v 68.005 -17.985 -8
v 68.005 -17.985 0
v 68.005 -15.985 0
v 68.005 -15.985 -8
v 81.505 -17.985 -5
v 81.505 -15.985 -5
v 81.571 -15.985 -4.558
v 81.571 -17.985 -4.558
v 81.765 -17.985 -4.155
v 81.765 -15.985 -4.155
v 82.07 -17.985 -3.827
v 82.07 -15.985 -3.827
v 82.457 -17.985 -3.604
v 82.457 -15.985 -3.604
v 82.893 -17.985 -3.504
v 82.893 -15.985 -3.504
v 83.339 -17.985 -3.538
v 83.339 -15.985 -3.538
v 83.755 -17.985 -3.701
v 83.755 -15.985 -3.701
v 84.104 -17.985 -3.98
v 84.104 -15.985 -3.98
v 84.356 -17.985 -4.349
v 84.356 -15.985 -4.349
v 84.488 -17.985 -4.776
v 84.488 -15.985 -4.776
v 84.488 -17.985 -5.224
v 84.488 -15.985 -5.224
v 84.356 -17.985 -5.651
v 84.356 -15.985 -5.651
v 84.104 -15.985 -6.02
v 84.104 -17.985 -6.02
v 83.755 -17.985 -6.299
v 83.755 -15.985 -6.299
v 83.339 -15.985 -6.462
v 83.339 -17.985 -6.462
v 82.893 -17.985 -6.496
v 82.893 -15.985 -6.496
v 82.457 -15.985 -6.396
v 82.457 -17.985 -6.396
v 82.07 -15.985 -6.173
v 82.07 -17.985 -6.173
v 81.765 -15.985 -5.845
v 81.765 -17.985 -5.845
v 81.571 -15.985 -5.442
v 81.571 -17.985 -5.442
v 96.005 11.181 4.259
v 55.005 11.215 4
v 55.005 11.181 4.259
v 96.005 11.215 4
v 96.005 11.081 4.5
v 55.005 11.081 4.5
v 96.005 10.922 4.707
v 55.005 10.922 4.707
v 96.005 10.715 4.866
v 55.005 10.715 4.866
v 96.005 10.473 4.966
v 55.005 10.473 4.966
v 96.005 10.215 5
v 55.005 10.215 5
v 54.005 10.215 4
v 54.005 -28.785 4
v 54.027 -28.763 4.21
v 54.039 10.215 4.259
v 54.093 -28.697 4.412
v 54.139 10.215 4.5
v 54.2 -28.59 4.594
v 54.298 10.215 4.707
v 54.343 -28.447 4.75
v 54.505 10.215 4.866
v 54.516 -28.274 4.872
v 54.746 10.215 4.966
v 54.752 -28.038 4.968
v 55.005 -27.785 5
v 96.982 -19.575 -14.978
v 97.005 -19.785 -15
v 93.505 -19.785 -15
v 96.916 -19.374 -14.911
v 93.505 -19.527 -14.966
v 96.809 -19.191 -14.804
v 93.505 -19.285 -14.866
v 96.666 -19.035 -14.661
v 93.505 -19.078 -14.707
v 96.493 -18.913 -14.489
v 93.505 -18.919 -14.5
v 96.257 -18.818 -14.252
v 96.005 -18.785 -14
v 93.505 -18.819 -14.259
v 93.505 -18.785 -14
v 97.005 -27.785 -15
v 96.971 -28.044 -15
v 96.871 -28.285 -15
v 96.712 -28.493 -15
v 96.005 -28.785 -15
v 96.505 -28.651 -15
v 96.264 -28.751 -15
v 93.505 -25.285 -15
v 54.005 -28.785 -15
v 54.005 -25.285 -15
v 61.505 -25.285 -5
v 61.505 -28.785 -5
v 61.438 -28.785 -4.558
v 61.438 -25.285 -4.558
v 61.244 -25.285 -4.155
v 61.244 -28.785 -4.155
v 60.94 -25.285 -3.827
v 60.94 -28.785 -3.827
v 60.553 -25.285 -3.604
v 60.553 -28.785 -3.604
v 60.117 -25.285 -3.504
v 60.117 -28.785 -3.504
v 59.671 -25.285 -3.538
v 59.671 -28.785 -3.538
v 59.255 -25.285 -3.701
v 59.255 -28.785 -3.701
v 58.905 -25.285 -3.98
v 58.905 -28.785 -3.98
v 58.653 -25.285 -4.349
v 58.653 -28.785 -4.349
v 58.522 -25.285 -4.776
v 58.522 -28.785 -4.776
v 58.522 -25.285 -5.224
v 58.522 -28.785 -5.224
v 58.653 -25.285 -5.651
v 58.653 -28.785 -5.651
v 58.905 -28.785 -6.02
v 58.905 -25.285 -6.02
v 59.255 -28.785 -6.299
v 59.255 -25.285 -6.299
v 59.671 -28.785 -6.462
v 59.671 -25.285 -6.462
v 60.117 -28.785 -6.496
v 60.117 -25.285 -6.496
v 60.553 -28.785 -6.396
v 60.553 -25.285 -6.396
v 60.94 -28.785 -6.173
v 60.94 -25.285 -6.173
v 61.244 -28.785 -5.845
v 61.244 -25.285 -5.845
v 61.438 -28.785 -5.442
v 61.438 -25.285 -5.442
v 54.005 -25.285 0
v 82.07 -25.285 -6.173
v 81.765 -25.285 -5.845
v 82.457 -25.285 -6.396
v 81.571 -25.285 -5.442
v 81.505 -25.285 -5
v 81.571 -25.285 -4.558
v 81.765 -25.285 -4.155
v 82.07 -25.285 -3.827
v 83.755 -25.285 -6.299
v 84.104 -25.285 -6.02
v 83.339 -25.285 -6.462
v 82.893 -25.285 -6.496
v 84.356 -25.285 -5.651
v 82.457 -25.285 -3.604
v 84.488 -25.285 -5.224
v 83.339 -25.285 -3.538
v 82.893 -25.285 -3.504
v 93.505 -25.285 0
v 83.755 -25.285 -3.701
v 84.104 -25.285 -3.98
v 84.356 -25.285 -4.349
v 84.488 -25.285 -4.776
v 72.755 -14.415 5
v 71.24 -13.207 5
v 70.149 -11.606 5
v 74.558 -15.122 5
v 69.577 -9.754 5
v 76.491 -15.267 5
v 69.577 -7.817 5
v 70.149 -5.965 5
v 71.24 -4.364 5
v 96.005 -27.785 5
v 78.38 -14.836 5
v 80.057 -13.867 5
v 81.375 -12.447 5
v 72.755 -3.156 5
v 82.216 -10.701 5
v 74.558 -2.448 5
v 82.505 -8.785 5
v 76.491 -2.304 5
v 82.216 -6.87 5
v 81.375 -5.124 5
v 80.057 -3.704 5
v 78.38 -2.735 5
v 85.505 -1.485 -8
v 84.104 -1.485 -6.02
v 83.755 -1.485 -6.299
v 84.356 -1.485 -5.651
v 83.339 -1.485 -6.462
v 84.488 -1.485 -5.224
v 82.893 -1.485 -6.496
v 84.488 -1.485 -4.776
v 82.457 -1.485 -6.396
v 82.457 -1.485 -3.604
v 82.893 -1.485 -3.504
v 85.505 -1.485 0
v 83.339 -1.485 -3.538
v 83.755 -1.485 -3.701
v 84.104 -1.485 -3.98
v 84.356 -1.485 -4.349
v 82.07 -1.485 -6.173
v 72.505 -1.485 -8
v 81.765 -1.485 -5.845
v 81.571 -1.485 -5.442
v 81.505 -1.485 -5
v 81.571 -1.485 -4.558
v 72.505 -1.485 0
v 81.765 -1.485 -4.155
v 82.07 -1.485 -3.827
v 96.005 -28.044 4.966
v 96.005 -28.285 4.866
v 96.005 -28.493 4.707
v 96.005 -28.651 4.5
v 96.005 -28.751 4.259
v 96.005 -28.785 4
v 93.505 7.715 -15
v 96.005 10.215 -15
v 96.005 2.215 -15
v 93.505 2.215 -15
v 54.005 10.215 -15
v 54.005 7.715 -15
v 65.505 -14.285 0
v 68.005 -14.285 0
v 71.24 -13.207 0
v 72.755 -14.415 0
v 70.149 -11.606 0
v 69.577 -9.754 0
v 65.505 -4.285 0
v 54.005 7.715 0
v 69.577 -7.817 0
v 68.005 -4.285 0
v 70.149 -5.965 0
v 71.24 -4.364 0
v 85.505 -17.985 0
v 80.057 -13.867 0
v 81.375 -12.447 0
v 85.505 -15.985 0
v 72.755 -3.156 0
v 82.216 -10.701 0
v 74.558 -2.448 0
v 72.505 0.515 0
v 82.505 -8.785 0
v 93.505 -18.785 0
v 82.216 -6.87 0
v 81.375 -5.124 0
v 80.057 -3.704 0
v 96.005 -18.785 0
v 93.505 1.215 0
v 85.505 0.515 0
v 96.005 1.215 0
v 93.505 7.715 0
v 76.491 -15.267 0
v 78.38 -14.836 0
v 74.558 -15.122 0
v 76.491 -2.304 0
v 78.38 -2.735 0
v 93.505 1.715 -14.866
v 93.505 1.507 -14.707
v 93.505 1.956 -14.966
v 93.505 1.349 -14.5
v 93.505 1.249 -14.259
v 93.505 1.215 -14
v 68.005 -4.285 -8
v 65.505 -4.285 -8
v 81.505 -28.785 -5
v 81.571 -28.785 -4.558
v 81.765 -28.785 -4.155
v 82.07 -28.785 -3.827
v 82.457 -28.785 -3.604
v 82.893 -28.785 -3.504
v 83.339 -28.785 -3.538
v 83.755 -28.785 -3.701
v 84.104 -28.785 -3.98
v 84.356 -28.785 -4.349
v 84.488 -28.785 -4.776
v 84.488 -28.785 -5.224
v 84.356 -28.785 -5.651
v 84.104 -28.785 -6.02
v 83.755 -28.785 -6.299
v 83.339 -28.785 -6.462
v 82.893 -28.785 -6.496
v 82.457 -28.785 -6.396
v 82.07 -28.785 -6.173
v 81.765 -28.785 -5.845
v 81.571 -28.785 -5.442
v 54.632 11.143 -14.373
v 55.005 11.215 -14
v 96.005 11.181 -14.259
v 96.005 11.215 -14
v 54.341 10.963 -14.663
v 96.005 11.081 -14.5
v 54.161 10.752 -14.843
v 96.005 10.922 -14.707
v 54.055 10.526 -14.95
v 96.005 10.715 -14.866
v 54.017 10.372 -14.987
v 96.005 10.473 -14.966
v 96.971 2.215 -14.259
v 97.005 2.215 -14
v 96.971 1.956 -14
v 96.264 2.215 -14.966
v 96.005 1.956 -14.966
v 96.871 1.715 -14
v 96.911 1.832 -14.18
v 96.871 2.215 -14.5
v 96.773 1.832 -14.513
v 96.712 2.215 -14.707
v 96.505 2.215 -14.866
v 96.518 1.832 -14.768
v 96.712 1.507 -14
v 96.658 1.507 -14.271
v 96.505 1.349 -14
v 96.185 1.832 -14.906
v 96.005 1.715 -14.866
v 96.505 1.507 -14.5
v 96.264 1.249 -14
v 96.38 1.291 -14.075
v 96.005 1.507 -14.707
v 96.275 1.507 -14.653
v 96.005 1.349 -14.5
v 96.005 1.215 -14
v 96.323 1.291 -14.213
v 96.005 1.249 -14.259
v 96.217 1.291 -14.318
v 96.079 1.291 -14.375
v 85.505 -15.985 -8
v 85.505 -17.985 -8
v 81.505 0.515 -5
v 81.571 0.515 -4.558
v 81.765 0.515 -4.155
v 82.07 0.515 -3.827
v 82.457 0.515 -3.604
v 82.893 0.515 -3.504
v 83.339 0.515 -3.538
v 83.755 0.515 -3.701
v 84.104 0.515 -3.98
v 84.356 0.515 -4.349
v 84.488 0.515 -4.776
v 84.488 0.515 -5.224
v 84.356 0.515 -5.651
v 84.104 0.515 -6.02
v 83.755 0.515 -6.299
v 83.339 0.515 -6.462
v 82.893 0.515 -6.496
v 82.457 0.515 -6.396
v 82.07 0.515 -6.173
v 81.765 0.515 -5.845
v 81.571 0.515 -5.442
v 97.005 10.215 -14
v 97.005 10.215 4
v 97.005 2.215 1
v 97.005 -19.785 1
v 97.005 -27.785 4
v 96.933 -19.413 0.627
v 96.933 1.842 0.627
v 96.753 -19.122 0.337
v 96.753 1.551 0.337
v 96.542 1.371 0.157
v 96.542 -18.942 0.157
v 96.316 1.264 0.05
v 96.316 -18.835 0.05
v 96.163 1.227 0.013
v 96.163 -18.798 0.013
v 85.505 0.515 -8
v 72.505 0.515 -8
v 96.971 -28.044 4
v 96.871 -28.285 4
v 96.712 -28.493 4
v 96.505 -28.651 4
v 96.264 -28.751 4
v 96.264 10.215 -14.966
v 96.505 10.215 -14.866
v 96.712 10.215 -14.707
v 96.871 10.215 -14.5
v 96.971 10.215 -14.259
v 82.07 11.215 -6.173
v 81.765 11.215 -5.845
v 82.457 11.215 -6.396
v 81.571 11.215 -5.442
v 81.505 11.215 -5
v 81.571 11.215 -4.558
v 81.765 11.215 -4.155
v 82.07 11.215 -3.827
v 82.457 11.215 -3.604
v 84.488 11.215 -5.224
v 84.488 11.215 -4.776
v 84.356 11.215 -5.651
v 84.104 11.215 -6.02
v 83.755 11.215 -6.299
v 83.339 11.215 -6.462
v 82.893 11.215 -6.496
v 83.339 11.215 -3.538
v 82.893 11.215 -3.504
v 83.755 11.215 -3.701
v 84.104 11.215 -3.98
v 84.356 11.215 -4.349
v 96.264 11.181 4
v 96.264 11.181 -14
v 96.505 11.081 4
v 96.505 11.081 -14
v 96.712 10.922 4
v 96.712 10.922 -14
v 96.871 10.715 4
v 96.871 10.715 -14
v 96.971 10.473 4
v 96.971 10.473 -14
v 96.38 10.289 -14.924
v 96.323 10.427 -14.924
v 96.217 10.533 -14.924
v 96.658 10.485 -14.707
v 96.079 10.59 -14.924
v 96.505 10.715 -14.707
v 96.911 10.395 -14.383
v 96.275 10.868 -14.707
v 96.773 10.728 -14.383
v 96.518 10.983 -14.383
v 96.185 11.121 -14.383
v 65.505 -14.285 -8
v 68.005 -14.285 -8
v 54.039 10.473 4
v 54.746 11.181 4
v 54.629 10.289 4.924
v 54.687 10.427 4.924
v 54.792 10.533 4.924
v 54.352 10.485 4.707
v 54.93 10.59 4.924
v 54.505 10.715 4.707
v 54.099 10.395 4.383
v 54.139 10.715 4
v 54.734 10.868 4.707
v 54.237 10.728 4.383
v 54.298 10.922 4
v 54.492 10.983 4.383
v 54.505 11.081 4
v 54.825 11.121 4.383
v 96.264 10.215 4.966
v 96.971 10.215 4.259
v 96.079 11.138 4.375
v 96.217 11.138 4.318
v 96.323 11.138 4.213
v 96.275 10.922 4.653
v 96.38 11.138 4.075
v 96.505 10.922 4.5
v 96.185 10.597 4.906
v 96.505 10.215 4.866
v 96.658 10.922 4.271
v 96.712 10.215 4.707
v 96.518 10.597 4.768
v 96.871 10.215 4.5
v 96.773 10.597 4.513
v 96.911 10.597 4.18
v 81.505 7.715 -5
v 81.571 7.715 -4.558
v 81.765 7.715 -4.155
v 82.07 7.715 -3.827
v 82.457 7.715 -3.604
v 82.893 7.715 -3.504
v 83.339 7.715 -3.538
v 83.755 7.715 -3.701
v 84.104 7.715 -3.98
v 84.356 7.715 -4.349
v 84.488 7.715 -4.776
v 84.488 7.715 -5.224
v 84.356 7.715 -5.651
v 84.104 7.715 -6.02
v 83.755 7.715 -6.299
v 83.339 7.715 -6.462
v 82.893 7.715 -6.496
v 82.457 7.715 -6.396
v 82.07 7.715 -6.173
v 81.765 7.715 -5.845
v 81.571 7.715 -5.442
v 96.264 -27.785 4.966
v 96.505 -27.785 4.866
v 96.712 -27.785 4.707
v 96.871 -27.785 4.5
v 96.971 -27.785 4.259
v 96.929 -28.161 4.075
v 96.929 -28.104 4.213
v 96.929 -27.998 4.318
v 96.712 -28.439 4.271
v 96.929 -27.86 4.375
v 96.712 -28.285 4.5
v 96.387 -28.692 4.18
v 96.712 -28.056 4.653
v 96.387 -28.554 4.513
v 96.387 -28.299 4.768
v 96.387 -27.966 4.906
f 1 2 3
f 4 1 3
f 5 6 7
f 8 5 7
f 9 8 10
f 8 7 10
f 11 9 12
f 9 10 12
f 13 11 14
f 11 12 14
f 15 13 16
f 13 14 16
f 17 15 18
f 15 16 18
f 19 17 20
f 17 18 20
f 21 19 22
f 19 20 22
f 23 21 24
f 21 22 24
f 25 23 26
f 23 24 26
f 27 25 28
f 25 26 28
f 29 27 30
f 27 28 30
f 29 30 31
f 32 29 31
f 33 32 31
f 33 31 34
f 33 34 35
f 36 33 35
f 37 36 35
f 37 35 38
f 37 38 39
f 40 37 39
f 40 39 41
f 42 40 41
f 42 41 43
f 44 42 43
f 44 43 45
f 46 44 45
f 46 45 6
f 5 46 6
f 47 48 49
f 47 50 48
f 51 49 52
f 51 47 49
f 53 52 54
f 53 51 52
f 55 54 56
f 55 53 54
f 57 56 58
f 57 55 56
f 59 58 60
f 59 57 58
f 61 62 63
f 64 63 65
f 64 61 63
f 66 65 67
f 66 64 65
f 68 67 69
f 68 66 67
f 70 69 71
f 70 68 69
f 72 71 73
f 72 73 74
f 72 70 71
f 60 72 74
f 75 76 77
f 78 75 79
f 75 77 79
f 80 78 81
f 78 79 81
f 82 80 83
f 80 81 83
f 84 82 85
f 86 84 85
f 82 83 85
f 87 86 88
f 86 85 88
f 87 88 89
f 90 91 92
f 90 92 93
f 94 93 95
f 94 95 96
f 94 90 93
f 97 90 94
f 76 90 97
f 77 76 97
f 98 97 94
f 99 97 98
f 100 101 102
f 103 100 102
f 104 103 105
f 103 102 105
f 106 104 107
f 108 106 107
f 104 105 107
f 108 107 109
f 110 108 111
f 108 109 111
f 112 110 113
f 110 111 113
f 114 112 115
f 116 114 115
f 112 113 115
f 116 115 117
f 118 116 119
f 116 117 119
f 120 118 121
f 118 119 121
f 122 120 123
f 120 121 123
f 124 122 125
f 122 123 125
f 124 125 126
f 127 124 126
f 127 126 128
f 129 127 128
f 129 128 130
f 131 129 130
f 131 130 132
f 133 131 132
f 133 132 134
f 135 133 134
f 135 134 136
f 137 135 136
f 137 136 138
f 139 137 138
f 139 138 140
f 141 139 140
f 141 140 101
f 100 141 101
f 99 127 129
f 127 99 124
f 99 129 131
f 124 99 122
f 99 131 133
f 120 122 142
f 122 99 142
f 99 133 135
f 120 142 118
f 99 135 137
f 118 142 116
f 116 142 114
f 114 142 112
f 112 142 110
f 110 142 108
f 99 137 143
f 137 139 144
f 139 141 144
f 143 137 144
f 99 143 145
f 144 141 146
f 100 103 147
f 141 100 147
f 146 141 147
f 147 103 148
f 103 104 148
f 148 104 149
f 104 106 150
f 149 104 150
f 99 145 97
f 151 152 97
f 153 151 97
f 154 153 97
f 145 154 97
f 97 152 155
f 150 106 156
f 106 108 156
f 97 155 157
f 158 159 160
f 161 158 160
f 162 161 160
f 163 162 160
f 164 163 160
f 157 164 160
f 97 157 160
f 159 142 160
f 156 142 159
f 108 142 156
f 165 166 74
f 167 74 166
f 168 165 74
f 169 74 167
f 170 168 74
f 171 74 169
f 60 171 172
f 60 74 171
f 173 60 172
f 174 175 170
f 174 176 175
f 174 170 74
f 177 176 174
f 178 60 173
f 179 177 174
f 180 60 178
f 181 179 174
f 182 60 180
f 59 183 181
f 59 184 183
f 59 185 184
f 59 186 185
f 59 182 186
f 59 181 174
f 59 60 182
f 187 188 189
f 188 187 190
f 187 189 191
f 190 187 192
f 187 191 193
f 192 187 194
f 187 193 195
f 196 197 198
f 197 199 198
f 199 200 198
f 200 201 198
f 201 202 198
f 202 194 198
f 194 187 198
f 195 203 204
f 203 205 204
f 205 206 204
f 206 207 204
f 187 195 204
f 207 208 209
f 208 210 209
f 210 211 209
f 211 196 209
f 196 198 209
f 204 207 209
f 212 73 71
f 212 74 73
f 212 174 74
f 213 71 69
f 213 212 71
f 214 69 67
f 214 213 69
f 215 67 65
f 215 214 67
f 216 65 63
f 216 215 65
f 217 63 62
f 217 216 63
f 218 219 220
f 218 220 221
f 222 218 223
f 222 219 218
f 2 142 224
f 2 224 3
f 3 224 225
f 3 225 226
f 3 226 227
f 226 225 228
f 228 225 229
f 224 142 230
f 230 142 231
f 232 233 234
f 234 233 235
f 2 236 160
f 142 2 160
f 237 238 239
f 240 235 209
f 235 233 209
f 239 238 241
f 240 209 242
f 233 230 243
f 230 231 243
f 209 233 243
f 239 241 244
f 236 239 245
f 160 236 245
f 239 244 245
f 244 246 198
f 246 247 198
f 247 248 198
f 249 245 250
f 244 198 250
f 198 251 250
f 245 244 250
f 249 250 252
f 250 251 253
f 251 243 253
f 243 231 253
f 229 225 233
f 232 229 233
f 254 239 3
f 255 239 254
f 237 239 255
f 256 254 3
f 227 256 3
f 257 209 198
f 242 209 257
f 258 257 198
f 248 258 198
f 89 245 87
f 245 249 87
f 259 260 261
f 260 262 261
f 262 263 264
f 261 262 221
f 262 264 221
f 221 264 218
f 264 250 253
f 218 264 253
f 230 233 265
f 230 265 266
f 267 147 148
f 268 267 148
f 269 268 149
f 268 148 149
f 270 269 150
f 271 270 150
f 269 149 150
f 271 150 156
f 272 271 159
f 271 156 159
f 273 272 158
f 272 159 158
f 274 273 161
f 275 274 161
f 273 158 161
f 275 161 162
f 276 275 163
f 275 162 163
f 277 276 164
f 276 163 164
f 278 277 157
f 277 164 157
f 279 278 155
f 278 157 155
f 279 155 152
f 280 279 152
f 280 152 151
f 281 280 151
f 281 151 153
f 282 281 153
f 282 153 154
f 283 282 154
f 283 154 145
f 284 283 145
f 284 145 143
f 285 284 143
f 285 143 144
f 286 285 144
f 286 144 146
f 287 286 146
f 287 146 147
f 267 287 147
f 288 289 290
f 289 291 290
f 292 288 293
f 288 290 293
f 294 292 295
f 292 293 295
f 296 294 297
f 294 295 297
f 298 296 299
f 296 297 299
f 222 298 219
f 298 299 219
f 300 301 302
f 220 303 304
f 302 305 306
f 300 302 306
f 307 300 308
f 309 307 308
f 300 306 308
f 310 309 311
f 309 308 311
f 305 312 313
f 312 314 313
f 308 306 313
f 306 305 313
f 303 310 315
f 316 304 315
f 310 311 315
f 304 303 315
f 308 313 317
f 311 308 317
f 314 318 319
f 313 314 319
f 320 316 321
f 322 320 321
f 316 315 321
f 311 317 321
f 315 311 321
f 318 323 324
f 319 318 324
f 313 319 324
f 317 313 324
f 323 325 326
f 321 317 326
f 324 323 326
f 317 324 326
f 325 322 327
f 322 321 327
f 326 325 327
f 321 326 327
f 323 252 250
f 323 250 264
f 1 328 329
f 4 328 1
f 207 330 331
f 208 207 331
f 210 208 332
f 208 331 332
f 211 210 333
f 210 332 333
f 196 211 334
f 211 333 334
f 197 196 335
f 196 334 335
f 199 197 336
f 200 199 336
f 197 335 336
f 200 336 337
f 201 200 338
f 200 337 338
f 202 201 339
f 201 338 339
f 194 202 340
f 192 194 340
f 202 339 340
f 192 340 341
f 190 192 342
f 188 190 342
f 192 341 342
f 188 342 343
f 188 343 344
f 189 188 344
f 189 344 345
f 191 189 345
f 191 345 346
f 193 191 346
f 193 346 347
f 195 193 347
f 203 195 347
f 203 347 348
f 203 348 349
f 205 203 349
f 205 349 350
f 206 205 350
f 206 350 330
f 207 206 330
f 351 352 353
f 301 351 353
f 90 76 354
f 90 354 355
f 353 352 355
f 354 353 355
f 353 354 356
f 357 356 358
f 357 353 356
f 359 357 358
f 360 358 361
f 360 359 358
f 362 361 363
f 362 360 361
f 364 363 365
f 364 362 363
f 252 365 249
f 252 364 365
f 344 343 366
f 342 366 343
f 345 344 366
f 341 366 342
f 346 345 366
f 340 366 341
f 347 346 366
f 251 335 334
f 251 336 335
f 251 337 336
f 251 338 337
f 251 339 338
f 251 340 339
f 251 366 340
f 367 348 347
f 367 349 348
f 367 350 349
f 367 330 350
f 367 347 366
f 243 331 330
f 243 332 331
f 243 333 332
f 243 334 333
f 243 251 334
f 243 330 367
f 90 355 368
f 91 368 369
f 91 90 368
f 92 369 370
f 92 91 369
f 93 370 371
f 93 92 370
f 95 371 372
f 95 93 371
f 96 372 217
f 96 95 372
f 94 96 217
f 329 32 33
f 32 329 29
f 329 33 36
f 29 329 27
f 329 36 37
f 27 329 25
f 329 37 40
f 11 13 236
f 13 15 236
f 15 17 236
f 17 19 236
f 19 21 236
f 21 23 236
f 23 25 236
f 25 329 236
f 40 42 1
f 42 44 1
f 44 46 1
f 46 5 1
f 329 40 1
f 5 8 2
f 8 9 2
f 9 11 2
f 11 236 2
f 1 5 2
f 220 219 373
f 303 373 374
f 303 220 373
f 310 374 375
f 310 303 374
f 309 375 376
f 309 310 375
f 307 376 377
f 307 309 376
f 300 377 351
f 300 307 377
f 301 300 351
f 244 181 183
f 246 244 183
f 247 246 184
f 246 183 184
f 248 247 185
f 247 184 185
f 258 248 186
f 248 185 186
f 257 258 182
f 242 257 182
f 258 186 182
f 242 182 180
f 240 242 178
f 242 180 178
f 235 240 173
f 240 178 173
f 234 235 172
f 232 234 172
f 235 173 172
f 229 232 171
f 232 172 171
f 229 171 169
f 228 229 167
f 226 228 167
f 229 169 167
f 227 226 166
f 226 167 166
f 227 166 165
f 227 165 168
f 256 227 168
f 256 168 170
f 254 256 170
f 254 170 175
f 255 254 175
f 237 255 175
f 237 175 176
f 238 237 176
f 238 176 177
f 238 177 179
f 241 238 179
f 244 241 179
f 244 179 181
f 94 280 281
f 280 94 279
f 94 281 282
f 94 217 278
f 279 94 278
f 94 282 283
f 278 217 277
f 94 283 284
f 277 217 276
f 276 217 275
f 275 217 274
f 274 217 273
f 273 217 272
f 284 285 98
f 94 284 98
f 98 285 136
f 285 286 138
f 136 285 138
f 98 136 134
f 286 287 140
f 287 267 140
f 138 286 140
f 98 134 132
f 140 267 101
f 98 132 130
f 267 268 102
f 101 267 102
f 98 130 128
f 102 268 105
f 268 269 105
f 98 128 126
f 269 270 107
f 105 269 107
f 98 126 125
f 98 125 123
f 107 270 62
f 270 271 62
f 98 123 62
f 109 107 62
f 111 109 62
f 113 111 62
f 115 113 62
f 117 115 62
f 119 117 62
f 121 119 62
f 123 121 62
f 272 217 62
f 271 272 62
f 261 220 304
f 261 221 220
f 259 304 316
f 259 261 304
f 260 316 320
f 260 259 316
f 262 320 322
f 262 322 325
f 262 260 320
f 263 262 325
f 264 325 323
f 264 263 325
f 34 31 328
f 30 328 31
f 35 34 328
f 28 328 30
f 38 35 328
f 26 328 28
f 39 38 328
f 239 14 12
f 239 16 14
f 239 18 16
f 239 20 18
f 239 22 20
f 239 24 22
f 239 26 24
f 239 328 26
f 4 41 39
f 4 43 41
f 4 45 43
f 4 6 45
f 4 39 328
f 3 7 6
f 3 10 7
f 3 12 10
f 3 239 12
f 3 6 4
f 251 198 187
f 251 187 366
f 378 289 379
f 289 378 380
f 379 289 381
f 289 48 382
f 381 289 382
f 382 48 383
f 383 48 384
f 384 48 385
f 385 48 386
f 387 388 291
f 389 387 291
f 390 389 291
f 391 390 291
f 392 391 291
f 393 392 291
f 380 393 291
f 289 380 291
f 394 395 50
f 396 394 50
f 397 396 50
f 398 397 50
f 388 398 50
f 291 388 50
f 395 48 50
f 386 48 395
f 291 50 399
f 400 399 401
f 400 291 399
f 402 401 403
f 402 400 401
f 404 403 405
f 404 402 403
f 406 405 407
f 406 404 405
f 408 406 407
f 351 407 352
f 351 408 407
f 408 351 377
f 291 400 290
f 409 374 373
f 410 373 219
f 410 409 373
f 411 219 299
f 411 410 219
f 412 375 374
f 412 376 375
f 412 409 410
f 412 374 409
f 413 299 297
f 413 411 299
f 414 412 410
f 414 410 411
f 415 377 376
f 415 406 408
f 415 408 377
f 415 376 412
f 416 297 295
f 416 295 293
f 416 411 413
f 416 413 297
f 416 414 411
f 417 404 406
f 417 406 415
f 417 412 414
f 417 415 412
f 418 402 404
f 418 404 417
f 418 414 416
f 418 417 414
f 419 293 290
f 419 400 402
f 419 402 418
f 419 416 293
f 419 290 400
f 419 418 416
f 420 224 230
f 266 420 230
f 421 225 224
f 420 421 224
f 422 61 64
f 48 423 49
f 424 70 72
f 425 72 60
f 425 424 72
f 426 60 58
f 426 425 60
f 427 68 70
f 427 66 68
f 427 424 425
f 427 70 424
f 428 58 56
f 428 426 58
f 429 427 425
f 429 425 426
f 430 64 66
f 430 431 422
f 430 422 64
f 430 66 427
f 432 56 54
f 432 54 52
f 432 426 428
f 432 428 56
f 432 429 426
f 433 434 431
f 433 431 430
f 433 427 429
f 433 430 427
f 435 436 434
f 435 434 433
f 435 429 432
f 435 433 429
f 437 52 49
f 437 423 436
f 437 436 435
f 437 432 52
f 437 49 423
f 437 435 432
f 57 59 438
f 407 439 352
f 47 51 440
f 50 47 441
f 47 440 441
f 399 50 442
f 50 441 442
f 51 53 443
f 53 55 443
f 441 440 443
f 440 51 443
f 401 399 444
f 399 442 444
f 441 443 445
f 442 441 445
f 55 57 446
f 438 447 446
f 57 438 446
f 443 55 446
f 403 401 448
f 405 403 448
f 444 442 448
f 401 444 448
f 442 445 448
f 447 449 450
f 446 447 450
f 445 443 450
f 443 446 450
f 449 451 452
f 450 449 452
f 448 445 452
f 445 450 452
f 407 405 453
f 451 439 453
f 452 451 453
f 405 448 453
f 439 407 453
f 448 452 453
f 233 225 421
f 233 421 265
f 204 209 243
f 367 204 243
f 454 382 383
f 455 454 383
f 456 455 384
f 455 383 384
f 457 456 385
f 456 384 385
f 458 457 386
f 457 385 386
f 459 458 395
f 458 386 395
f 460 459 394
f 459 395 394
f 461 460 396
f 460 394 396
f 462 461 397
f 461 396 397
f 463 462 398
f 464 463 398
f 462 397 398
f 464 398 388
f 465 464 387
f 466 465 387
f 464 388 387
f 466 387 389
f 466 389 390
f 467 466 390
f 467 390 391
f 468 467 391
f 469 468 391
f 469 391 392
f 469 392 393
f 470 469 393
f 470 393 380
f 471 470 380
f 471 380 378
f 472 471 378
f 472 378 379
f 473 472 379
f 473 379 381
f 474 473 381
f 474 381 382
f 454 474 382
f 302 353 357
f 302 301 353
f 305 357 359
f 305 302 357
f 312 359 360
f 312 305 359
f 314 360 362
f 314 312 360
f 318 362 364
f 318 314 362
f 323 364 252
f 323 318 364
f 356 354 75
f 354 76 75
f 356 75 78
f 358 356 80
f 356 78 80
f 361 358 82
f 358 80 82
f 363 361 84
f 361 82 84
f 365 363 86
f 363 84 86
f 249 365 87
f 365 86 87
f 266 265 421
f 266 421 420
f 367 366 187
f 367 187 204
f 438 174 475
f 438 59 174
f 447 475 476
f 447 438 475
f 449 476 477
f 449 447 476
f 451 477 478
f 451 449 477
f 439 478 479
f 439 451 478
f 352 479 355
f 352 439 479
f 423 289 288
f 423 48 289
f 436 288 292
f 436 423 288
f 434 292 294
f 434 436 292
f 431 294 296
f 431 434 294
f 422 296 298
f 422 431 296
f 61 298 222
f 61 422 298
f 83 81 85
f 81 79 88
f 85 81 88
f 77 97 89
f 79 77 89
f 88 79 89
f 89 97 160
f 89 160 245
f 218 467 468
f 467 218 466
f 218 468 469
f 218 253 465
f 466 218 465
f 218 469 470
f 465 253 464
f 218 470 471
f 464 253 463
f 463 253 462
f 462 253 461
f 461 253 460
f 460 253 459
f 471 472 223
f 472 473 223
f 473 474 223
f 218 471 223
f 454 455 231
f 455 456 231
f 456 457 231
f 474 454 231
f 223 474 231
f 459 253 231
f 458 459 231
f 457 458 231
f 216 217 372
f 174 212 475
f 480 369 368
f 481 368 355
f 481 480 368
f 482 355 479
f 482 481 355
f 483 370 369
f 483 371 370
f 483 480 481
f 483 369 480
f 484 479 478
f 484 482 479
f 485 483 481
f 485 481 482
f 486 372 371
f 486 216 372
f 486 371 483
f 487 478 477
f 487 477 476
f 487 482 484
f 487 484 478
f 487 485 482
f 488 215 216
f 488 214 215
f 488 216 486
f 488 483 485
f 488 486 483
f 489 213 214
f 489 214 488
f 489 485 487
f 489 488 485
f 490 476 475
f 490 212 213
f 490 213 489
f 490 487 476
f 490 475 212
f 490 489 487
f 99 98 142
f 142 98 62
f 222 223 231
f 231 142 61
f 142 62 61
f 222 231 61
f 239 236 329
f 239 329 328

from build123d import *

# Parameters (mm, degrees)
SKETCH1_W           = 43
SKETCH1_H           = 40
BOSS_EXTRUDE1_DEPTH = 5
SKETCH2_W           = 13
SKETCH2_H           = 2
SKETCH2_W_2         = 17.5
SKETCH2_W_3         = 2.5
SKETCH2_H_2         = 10
BOSS_EXTRUDE3_DEPTH = 8
BOSS_EXTRUDE4_DEPTH = 15
SKETCH4_R           = 1.5
CUT_EXTRUDE1_DEPTH  = 65
SKETCH6_R           = 1.5
CUT_EXTRUDE2_DEPTH  = 10
SKETCH7_R           = 6.5
CUT_EXTRUDE3_DEPTH  = 20
SKETCH8_W           = 15
SKETCH8_H           = 20
CUT_EXTRUDE4_DEPTH  = 5
FILLET1_R           = 1
FILLET2_R           = 1


with BuildPart() as part:
    # Sketch1 → Boss-Extrude1 (new body)
    with BuildSketch(Plane.XY):
        with Locations((75.504805995, -8.785410368)):
            Rectangle(SKETCH1_W, SKETCH1_H)
    extrude(amount=BOSS_EXTRUDE1_DEPTH)

    # Sketch2 → Boss-Extrude3 (add)
    with BuildSketch(Plane(origin=(0, 0, 0), x_dir=(-1, 0, 0), z_dir=(0, 0, -1))):
        with Locations((-79.004805995, -0.485410368)):
            Rectangle(SKETCH2_W, SKETCH2_H)
        with Locations((-76.754805995, -16.985410368)):
            Rectangle(SKETCH2_W_2, SKETCH2_H)
        with Locations((-66.754805995, -9.285410368)):
            Rectangle(SKETCH2_W_3, SKETCH2_H_2)
    extrude(amount=BOSS_EXTRUDE3_DEPTH)

    # Sketch3 → Boss-Extrude4 (add)
    with BuildSketch(Plane(origin=(0, 0, 0), x_dir=(-1, 0, 0), z_dir=(0, 0, -1))):
        Polygon((-54.004805995, 11.214589632), (-97.004805995, 11.214589632), (-97.004805995, -28.785410368), (-54.004805995, -28.785410368), (-54.004805995, -25.285410368), (-93.504805995, -25.285410368), (-93.504805995, 7.714589632), (-54.004805995, 7.714589632), align=None)
    extrude(amount=BOSS_EXTRUDE4_DEPTH)

    # Sketch4 → Cut-Extrude1 (cut)
    with BuildSketch(Plane(origin=(0, 11.214589632, 0), x_dir=(1, 0, 0), z_dir=(0, 1, 0))):
        with Locations(Location((83.004805995, 5, 0), (0, 0, 180))):
            Circle(SKETCH4_R)
    extrude(amount=-CUT_EXTRUDE1_DEPTH, mode=Mode.SUBTRACT)

    # Sketch6 → Cut-Extrude2 (cut)
    with BuildSketch(Plane.XZ.offset(28.785410368)):
        with Locations((60.004805995, -5)):
            Circle(SKETCH6_R)
    extrude(amount=-CUT_EXTRUDE2_DEPTH, mode=Mode.SUBTRACT)

    # Sketch7 → Cut-Extrude3 (cut)
    with BuildSketch(Plane.XY.offset(5)):
        with Locations((76.004805995, -8.785410368)):
            Circle(SKETCH7_R)
    extrude(amount=-CUT_EXTRUDE3_DEPTH, mode=Mode.SUBTRACT)

    # Sketch8 → Cut-Extrude4 (cut)
    with BuildSketch(Plane(origin=(97.004805995, 0, 0), x_dir=(0, 0, -1), z_dir=(1, 0, 0))):
        with Locations((7.5, -8.785410368)):
            Rectangle(SKETCH8_W, SKETCH8_H)
    extrude(amount=-CUT_EXTRUDE4_DEPTH, mode=Mode.SUBTRACT)

    # Fillet1
    fillet1_edges = [part.edges().sort_by_distance(p)[0] for p in [
        (54.004805995, 11.214589632, -5),
        (54.004805995, -8.785410368, 5),
        (75.504805995, -28.785410368, 5),
        (97.004805995, -28.785410368, -5),
        (97.004805995, -8.785410368, 5),
        (75.504805995, 11.214589632, 5),
        (97.004805995, 11.214589632, -5),
        (97.004805995, 6.214589632, -15),
        (75.504805995, 11.214589632, -15),
    ]]
    fillet(fillet1_edges, radius=FILLET1_R)

    # Fillet2
    fillet2_edges = [part.edges().sort_by_distance(p)[0] for p in [
        (94.754805995, 1.214589632, -15),
        (95.254805995, -18.785410368, -15),
        (97.004805995, -8.785410368, 0),
        (97.004805995, -18.785410368, -7.5),
        (97.004805995, 1.214589632, -7),
        (96.711912776, 1.214589632, -14.707106781),
    ]]
    fillet(fillet2_edges, radius=FILLET2_R)


solid = part.part
